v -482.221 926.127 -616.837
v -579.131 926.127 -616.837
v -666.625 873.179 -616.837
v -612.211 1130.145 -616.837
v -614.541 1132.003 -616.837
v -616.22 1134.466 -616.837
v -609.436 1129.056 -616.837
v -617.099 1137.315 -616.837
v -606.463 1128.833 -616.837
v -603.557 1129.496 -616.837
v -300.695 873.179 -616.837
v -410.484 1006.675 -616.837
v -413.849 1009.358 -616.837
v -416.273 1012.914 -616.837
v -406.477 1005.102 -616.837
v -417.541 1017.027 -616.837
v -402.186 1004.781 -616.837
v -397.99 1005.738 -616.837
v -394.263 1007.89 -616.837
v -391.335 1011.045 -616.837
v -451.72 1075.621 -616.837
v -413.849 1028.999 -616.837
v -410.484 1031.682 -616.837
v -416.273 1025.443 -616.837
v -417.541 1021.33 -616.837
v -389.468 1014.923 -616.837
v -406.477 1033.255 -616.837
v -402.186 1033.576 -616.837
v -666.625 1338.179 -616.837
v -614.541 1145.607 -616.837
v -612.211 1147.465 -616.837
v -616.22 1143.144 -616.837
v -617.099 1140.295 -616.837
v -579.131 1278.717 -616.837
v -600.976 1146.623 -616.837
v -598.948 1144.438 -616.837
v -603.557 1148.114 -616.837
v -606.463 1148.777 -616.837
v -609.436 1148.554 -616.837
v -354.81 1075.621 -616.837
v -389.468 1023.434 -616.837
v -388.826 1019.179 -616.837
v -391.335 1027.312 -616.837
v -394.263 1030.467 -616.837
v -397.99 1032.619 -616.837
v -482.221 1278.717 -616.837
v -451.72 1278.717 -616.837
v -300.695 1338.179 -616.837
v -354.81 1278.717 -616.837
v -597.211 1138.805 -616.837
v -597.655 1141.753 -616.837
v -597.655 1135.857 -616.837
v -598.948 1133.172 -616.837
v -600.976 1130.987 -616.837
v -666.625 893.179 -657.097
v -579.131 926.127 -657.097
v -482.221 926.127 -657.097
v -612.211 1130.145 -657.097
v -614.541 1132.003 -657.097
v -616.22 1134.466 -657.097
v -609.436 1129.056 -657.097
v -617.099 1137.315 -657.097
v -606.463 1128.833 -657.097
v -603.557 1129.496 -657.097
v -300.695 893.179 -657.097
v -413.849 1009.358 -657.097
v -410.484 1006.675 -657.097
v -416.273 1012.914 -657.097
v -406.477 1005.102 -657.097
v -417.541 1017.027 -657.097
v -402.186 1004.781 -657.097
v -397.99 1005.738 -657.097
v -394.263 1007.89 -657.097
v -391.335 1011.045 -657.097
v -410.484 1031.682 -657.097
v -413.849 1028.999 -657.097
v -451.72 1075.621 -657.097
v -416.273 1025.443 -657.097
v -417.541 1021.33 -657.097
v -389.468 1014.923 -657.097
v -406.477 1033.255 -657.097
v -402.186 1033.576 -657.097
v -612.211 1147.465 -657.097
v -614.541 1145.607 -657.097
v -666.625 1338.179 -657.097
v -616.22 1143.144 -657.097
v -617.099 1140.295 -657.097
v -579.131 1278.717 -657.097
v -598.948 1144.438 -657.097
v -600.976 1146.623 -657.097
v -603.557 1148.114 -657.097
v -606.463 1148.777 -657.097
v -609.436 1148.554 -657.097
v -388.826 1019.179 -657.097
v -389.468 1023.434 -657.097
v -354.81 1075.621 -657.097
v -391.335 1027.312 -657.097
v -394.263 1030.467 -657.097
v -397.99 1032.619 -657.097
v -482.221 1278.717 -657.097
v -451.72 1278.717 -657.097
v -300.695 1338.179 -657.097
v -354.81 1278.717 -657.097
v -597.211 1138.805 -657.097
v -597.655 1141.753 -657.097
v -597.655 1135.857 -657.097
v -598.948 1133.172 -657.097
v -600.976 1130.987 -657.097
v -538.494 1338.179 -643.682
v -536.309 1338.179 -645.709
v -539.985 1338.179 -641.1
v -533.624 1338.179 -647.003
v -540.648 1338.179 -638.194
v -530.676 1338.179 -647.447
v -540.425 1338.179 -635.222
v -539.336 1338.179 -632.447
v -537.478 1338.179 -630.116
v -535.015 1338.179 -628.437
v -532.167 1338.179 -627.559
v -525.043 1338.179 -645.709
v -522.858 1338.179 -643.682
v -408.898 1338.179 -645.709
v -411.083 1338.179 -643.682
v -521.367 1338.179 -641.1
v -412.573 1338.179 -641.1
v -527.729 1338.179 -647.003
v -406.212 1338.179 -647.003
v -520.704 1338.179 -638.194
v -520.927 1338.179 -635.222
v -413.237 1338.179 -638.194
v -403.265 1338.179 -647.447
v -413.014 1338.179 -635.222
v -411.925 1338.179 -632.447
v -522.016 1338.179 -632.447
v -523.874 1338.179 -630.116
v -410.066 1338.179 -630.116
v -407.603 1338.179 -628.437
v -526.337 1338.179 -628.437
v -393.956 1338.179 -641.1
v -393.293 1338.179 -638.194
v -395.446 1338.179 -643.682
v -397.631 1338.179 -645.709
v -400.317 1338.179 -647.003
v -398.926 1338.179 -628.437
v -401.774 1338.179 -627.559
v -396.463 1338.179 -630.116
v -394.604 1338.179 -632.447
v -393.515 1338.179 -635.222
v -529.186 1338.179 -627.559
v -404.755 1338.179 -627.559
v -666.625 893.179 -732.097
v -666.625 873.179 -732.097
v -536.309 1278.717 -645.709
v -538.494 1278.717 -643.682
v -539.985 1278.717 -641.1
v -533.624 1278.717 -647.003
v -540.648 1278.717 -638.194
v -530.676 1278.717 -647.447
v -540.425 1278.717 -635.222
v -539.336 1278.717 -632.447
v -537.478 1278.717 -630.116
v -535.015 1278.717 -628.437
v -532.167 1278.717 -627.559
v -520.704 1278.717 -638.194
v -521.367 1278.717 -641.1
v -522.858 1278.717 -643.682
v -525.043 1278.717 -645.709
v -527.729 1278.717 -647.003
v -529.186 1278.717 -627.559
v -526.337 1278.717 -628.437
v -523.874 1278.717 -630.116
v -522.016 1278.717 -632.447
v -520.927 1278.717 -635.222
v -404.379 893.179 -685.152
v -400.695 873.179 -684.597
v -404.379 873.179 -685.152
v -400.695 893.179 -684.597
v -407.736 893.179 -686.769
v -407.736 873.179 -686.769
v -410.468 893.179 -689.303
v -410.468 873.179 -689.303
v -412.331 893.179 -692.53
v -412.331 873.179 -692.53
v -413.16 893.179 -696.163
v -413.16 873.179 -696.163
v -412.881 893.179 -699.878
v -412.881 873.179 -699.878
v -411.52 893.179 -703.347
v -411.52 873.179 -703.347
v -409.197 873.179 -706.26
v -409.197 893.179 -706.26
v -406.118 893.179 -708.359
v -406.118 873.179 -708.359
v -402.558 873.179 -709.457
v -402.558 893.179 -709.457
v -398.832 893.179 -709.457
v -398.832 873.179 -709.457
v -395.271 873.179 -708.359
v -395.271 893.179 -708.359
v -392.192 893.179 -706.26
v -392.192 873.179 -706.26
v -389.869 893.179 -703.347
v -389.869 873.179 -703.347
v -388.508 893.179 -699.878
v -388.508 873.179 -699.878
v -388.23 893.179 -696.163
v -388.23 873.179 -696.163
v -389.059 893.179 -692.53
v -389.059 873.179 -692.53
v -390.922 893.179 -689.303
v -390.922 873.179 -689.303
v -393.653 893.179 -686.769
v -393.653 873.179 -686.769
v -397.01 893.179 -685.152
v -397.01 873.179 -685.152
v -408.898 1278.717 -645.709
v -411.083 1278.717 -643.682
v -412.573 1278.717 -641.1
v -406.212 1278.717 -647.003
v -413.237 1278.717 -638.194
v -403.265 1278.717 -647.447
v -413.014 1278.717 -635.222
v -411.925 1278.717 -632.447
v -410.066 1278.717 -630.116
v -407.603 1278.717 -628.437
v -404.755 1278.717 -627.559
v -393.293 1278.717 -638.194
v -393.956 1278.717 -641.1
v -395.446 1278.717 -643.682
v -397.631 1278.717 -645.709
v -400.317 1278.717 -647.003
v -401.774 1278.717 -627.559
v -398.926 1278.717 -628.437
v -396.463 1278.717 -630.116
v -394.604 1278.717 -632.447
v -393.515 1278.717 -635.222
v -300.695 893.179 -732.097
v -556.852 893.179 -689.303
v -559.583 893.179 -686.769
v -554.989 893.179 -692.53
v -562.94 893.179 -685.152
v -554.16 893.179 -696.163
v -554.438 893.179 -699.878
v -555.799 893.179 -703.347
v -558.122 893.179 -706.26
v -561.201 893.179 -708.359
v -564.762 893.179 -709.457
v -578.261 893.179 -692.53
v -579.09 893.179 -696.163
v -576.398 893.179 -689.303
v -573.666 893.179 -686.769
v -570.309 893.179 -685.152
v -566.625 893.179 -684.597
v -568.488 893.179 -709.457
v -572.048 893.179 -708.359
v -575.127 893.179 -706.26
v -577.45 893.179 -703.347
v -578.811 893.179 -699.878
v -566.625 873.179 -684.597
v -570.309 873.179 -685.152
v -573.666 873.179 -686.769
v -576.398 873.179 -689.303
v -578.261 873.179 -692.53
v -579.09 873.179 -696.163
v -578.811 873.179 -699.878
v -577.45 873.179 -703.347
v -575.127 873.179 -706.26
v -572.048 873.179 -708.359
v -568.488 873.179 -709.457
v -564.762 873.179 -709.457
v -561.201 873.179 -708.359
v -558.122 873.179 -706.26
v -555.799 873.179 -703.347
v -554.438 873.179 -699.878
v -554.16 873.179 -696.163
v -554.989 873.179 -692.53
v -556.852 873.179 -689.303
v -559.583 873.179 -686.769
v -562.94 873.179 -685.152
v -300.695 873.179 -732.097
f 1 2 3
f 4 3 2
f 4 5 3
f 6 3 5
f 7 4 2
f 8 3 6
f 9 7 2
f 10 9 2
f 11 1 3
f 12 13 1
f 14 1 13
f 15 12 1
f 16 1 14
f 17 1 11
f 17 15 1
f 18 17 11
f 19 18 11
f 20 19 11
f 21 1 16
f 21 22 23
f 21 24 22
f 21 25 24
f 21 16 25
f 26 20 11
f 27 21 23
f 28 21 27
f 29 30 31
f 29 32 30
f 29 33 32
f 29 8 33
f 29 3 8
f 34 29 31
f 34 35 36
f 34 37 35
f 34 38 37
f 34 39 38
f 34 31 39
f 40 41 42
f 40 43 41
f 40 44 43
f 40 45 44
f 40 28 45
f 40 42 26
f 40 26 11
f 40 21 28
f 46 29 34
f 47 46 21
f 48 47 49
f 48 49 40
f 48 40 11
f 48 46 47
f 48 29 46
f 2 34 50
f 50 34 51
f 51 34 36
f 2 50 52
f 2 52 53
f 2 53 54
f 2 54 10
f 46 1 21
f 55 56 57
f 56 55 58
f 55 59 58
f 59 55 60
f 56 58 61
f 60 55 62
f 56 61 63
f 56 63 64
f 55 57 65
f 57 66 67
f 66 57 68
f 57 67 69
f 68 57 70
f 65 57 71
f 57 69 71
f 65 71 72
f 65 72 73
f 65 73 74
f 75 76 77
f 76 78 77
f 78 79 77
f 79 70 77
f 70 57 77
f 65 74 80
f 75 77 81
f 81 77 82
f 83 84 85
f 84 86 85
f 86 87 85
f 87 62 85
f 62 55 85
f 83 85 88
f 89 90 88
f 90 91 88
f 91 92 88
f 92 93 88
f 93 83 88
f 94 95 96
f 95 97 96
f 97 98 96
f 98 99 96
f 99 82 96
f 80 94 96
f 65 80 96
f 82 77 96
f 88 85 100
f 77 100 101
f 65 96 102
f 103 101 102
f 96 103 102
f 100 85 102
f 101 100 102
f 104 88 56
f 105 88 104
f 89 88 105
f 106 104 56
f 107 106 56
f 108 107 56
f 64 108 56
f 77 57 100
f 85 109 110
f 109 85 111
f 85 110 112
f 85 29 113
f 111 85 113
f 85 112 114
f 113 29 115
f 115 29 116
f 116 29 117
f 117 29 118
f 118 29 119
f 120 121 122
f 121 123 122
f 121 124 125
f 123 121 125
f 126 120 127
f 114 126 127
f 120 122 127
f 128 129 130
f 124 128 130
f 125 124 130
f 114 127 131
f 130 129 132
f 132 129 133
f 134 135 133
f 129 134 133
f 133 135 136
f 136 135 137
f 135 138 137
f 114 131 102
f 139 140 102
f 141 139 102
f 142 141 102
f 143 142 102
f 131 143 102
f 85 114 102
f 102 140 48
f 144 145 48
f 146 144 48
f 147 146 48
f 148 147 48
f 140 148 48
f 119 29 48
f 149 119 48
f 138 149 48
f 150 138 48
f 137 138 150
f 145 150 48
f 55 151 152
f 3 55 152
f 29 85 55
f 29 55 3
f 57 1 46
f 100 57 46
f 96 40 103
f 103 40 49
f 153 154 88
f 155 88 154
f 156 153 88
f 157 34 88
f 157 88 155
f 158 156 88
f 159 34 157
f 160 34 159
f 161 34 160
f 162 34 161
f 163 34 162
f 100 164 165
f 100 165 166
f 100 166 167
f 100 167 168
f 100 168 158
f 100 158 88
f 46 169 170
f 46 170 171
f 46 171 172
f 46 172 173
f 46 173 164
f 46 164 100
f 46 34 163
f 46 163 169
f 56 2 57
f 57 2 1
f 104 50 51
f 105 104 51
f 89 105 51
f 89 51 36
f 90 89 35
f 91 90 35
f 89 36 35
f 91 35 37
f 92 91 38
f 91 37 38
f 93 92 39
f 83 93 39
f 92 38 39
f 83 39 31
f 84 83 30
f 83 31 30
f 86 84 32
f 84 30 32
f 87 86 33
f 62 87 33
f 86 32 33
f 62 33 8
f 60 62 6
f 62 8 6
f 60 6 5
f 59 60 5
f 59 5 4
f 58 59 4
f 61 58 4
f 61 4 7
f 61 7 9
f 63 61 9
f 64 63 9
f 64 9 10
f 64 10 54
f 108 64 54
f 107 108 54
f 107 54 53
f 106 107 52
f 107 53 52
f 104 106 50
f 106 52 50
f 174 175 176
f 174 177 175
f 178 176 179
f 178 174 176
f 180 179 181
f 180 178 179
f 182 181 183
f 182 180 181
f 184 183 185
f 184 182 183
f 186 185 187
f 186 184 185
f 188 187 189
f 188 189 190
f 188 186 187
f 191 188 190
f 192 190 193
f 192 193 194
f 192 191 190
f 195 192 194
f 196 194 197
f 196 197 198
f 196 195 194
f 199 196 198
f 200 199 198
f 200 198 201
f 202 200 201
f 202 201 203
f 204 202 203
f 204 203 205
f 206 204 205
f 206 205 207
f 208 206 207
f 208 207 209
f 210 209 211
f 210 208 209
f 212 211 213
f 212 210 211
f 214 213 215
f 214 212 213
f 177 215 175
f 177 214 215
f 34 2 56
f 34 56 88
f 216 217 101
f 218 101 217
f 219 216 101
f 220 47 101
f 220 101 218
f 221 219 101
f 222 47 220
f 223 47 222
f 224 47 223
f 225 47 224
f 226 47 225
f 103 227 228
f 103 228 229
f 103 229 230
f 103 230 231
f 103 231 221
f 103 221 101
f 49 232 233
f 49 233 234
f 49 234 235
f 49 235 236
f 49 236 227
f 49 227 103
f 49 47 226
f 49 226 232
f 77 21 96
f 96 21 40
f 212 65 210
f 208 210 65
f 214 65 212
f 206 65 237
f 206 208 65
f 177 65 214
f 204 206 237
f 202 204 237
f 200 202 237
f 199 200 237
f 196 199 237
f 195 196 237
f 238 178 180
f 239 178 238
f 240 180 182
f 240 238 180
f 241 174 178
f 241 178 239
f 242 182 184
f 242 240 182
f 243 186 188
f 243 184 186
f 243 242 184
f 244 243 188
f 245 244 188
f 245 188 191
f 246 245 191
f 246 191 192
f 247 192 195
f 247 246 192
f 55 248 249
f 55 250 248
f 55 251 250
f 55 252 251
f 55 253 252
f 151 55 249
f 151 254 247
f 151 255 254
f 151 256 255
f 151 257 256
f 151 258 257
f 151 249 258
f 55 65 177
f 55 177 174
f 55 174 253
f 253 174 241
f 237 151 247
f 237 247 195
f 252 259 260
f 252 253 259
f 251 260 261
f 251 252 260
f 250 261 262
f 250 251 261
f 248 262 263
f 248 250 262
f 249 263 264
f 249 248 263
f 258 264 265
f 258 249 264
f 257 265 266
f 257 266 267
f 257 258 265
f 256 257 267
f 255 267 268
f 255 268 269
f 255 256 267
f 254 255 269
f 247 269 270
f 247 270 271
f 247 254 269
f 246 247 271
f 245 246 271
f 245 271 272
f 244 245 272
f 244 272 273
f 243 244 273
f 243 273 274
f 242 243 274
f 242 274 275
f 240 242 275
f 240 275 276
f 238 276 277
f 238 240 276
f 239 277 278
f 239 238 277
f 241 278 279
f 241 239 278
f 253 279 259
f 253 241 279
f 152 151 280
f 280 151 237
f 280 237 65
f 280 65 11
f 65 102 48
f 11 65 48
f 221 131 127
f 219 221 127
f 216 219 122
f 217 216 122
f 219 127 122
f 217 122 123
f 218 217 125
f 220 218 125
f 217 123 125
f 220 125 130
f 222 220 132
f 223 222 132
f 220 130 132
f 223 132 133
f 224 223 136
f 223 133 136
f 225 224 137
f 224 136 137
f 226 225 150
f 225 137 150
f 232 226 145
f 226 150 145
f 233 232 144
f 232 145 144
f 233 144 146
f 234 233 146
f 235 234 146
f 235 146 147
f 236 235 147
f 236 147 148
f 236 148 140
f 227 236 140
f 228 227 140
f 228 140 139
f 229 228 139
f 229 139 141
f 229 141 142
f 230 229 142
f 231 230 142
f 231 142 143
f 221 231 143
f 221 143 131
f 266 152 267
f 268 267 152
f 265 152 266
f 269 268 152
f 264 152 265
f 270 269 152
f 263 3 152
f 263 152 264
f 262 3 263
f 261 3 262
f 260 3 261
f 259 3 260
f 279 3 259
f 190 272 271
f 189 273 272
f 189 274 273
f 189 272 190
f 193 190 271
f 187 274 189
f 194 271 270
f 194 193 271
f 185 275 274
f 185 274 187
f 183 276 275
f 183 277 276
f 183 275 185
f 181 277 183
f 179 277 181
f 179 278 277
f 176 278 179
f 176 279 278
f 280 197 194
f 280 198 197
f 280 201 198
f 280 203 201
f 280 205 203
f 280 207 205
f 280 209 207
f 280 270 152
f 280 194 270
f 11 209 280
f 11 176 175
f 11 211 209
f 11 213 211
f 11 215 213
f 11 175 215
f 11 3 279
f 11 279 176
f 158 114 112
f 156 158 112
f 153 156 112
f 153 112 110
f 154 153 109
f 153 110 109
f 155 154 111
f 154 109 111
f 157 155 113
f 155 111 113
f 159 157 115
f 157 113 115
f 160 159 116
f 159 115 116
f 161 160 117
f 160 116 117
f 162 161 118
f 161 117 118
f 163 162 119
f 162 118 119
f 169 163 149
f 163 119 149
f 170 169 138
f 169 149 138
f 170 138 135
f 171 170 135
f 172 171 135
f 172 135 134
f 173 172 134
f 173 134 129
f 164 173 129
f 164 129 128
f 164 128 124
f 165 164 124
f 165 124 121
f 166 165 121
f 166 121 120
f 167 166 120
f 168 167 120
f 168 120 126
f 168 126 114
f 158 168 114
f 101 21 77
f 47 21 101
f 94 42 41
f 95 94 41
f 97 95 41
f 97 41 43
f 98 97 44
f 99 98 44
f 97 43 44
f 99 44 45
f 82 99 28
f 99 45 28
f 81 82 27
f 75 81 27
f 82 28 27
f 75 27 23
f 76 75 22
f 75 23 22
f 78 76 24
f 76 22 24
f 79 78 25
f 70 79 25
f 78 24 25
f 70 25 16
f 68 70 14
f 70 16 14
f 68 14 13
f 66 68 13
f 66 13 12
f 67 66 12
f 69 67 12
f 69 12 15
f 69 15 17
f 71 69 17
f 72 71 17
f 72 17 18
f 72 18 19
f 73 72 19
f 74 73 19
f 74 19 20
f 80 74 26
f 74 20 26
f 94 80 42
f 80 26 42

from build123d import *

# Parameters (mm, degrees)
SKETCH_1_W                      = 365.93
SKETCH_1_H                      = 455
SKETCH_1_R                      = 10
SKETCH_1_R_2                    = 14.438127561
SKETCH_1_W_2                    = 96.91
SKETCH_1_H_2                    = 352.59
SKETCH_1_H_3                    = 203.096012828
EXTRUDE_1_DEPTH                 = 40.26
CUT_EXTRUDE_1_REACH             = 1042.764
SKETCH_2_R                      = 10
CUT_EXTRUDE_1_DIRECTION_2_DEPTH = 1041.76399807
SKETCH_3_W                      = 365.93
SKETCH_3_H                      = 20
EXTRUDE_2_DEPTH                 = 80
CUT_EXTRUDE_2_REACH             = 1086.862
SKETCH_6_R                      = 12.5
CUT_EXTRUDE_4_DEPTH             = 1571.967331718
CUT_EXTRUDE_4_DEPTH_BACK        = 1571.967331718
SKETCH_9_W                      = 5
SKETCH_9_H                      = 20
CUT_EXTRUDE_5_DEPTH             = 1569.627549285
CUT_EXTRUDE_5_DEPTH_BACK        = 1569.627549285
SKETCH_10_W                     = 75
SKETCH_10_H                     = 10
SKETCH_11_W                     = 365.93
SKETCH_11_H                     = 115.26
SKETCH_11_R                     = 12.5
EXTRUDE_4_DEPTH                 = 10


with BuildPart() as part:
    # 草图1 → 凸台-拉伸1 (new body)
    with BuildSketch(Plane.XY.offset(-616.836895005)):
        with Locations((-483.659609698, 1110.678523142)):
            Rectangle(SKETCH_1_W, SKETCH_1_H)
        with Locations((-607.210787573, 1138.804962693)):
            Circle(SKETCH_1_R, mode=Mode.SUBTRACT)
        with Locations((-403.264609698, 1019.178523142)):
            Circle(SKETCH_1_R_2, mode=Mode.SUBTRACT)
        with Locations((-530.676153664, 1102.421638316)):
            Rectangle(SKETCH_1_W_2, SKETCH_1_H_2, mode=Mode.SUBTRACT)
        with Locations((-403.264609698, 1177.168631902)):
            Rectangle(SKETCH_1_W_2, SKETCH_1_H_3, mode=Mode.SUBTRACT)
    extrude(amount=-EXTRUDE_1_DEPTH)

    # 草图2 → 切除-拉伸1 (cut, up to next)
    with BuildSketch(Plane(origin=(0, 1338.178523142, 0), x_dir=(1, 0, 0), z_dir=(0, 1, 0)), mode=Mode.PRIVATE) as cut_extrude_1_sk1:
        with Locations(Location((-530.676153664, 637.446895005, 0), (0, 0, 90))):
            Circle(SKETCH_2_R)
    cut_extrude_1_tool1 = extrude(cut_extrude_1_sk1.sketch, amount=-CUT_EXTRUDE_1_REACH, mode=Mode.PRIVATE) & part.part
    # 草图2 → 切除-拉伸1 (cut, up to next)
    with BuildSketch(Plane(origin=(0, 1338.178523142, 0), x_dir=(1, 0, 0), z_dir=(0, 1, 0)), mode=Mode.PRIVATE) as cut_extrude_1_sk2:
        with Locations(Location((-403.264609698, 637.446895005, 0), (0, 0, 90))):
            Circle(SKETCH_2_R)
    cut_extrude_1_tool2 = extrude(cut_extrude_1_sk2.sketch, amount=-CUT_EXTRUDE_1_REACH, mode=Mode.PRIVATE) & part.part
    add(cut_extrude_1_tool1.solids().sort_by_distance((-530.676154, 1338.178523, -637.446895))[0], mode=Mode.SUBTRACT)
    add(cut_extrude_1_tool2.solids().sort_by_distance((-403.26461, 1338.178523, -637.446895))[0], mode=Mode.SUBTRACT)

    # 草图2 → 切除-拉伸1 direction 2 (cut)
    with BuildSketch(Plane(origin=(0, 1338.178523142, 0), x_dir=(1, 0, 0), z_dir=(0, 1, 0))):
        with Locations(Location((-530.676153664, 637.446895005, 0), (0, 0, 90))):
            Circle(SKETCH_2_R)
        with Locations(Location((-403.264609698, 637.446895005, 0), (0, 0, 90))):
            Circle(SKETCH_2_R)
    extrude(amount=CUT_EXTRUDE_1_DIRECTION_2_DEPTH, mode=Mode.SUBTRACT)

    # 草图3 → 凸台-拉伸2 (add)
    with BuildSketch(Plane(origin=(0, 0, -657.096895005), x_dir=(-1, 0, 0), z_dir=(0, 0, -1))):
        with Locations((483.659609698, 893.178523142)):
            Rectangle(SKETCH_3_W, SKETCH_3_H)
    extrude(amount=EXTRUDE_2_DEPTH)

    # 草图6 → 切除-拉伸2 (cut, up to next)
    with BuildSketch(Plane(origin=(0, 903.178523142, 0), x_dir=(1, 0, 0), z_dir=(0, 1, 0)), mode=Mode.PRIVATE) as cut_extrude_2_sk1:
        with Locations(Location((-566.624609698, 697.096895005, 0), (0, 0, 270))):
            Circle(SKETCH_6_R)
    cut_extrude_2_tool1 = extrude(cut_extrude_2_sk1.sketch, amount=-CUT_EXTRUDE_2_REACH, mode=Mode.PRIVATE) & part.part
    # 草图6 → 切除-拉伸2 (cut, up to next)
    with BuildSketch(Plane(origin=(0, 903.178523142, 0), x_dir=(1, 0, 0), z_dir=(0, 1, 0)), mode=Mode.PRIVATE) as cut_extrude_2_sk2:
        with Locations(Location((-400.694609698, 697.096895005, 0), (0, 0, 270))):
            Circle(SKETCH_6_R)
    cut_extrude_2_tool2 = extrude(cut_extrude_2_sk2.sketch, amount=-CUT_EXTRUDE_2_REACH, mode=Mode.PRIVATE) & part.part
    add(cut_extrude_2_tool1.solids().sort_by_distance((-566.62461, 903.178523, -697.096895))[0], mode=Mode.SUBTRACT)
    add(cut_extrude_2_tool2.solids().sort_by_distance((-400.69461, 903.178523, -697.096895))[0], mode=Mode.SUBTRACT)

    # 草图9 → 切除-拉伸4 (cut, two sides: drawn at the far end of the back side and taken through both)
    with BuildSketch(Plane(origin=(-300.694609698, 0, 0), x_dir=(0, 0, -1), z_dir=(1, 0, 0)).offset(-CUT_EXTRUDE_4_DEPTH_BACK)):
        with Locations((734.596895005, 893.178523142)):
            Rectangle(SKETCH_9_W, SKETCH_9_H)
    extrude(amount=CUT_EXTRUDE_4_DEPTH + CUT_EXTRUDE_4_DEPTH_BACK, mode=Mode.SUBTRACT)

    # 草图10 → 切除-拉伸5 (cut, two sides: drawn at the far end of the back side and taken through both)
    with BuildSketch(Plane(origin=(-300.694609698, 0, 0), x_dir=(0, 0, -1), z_dir=(1, 0, 0)).offset(-CUT_EXTRUDE_5_DEPTH_BACK)):
        with Locations((694.596895005, 898.178523142)):
            Rectangle(SKETCH_10_W, SKETCH_10_H)
    extrude(amount=CUT_EXTRUDE_5_DEPTH + CUT_EXTRUDE_5_DEPTH_BACK, mode=Mode.SUBTRACT)

    # 草图11 → 凸台-拉伸4 (add)
    with BuildSketch(Plane.XZ.offset(-883.178523142)):
        with Locations((-483.659609698, -674.466895005)):
            Rectangle(SKETCH_11_W, SKETCH_11_H)
        with Locations(Location((-400.694609698, -697.096895005, 0), (0, 0, 90))):
            Circle(SKETCH_11_R, mode=Mode.SUBTRACT)
        with Locations(Location((-566.624609698, -697.096895005, 0), (0, 0, 90))):
            Circle(SKETCH_11_R, mode=Mode.SUBTRACT)
    extrude(amount=EXTRUDE_4_DEPTH)


solid = part.part
